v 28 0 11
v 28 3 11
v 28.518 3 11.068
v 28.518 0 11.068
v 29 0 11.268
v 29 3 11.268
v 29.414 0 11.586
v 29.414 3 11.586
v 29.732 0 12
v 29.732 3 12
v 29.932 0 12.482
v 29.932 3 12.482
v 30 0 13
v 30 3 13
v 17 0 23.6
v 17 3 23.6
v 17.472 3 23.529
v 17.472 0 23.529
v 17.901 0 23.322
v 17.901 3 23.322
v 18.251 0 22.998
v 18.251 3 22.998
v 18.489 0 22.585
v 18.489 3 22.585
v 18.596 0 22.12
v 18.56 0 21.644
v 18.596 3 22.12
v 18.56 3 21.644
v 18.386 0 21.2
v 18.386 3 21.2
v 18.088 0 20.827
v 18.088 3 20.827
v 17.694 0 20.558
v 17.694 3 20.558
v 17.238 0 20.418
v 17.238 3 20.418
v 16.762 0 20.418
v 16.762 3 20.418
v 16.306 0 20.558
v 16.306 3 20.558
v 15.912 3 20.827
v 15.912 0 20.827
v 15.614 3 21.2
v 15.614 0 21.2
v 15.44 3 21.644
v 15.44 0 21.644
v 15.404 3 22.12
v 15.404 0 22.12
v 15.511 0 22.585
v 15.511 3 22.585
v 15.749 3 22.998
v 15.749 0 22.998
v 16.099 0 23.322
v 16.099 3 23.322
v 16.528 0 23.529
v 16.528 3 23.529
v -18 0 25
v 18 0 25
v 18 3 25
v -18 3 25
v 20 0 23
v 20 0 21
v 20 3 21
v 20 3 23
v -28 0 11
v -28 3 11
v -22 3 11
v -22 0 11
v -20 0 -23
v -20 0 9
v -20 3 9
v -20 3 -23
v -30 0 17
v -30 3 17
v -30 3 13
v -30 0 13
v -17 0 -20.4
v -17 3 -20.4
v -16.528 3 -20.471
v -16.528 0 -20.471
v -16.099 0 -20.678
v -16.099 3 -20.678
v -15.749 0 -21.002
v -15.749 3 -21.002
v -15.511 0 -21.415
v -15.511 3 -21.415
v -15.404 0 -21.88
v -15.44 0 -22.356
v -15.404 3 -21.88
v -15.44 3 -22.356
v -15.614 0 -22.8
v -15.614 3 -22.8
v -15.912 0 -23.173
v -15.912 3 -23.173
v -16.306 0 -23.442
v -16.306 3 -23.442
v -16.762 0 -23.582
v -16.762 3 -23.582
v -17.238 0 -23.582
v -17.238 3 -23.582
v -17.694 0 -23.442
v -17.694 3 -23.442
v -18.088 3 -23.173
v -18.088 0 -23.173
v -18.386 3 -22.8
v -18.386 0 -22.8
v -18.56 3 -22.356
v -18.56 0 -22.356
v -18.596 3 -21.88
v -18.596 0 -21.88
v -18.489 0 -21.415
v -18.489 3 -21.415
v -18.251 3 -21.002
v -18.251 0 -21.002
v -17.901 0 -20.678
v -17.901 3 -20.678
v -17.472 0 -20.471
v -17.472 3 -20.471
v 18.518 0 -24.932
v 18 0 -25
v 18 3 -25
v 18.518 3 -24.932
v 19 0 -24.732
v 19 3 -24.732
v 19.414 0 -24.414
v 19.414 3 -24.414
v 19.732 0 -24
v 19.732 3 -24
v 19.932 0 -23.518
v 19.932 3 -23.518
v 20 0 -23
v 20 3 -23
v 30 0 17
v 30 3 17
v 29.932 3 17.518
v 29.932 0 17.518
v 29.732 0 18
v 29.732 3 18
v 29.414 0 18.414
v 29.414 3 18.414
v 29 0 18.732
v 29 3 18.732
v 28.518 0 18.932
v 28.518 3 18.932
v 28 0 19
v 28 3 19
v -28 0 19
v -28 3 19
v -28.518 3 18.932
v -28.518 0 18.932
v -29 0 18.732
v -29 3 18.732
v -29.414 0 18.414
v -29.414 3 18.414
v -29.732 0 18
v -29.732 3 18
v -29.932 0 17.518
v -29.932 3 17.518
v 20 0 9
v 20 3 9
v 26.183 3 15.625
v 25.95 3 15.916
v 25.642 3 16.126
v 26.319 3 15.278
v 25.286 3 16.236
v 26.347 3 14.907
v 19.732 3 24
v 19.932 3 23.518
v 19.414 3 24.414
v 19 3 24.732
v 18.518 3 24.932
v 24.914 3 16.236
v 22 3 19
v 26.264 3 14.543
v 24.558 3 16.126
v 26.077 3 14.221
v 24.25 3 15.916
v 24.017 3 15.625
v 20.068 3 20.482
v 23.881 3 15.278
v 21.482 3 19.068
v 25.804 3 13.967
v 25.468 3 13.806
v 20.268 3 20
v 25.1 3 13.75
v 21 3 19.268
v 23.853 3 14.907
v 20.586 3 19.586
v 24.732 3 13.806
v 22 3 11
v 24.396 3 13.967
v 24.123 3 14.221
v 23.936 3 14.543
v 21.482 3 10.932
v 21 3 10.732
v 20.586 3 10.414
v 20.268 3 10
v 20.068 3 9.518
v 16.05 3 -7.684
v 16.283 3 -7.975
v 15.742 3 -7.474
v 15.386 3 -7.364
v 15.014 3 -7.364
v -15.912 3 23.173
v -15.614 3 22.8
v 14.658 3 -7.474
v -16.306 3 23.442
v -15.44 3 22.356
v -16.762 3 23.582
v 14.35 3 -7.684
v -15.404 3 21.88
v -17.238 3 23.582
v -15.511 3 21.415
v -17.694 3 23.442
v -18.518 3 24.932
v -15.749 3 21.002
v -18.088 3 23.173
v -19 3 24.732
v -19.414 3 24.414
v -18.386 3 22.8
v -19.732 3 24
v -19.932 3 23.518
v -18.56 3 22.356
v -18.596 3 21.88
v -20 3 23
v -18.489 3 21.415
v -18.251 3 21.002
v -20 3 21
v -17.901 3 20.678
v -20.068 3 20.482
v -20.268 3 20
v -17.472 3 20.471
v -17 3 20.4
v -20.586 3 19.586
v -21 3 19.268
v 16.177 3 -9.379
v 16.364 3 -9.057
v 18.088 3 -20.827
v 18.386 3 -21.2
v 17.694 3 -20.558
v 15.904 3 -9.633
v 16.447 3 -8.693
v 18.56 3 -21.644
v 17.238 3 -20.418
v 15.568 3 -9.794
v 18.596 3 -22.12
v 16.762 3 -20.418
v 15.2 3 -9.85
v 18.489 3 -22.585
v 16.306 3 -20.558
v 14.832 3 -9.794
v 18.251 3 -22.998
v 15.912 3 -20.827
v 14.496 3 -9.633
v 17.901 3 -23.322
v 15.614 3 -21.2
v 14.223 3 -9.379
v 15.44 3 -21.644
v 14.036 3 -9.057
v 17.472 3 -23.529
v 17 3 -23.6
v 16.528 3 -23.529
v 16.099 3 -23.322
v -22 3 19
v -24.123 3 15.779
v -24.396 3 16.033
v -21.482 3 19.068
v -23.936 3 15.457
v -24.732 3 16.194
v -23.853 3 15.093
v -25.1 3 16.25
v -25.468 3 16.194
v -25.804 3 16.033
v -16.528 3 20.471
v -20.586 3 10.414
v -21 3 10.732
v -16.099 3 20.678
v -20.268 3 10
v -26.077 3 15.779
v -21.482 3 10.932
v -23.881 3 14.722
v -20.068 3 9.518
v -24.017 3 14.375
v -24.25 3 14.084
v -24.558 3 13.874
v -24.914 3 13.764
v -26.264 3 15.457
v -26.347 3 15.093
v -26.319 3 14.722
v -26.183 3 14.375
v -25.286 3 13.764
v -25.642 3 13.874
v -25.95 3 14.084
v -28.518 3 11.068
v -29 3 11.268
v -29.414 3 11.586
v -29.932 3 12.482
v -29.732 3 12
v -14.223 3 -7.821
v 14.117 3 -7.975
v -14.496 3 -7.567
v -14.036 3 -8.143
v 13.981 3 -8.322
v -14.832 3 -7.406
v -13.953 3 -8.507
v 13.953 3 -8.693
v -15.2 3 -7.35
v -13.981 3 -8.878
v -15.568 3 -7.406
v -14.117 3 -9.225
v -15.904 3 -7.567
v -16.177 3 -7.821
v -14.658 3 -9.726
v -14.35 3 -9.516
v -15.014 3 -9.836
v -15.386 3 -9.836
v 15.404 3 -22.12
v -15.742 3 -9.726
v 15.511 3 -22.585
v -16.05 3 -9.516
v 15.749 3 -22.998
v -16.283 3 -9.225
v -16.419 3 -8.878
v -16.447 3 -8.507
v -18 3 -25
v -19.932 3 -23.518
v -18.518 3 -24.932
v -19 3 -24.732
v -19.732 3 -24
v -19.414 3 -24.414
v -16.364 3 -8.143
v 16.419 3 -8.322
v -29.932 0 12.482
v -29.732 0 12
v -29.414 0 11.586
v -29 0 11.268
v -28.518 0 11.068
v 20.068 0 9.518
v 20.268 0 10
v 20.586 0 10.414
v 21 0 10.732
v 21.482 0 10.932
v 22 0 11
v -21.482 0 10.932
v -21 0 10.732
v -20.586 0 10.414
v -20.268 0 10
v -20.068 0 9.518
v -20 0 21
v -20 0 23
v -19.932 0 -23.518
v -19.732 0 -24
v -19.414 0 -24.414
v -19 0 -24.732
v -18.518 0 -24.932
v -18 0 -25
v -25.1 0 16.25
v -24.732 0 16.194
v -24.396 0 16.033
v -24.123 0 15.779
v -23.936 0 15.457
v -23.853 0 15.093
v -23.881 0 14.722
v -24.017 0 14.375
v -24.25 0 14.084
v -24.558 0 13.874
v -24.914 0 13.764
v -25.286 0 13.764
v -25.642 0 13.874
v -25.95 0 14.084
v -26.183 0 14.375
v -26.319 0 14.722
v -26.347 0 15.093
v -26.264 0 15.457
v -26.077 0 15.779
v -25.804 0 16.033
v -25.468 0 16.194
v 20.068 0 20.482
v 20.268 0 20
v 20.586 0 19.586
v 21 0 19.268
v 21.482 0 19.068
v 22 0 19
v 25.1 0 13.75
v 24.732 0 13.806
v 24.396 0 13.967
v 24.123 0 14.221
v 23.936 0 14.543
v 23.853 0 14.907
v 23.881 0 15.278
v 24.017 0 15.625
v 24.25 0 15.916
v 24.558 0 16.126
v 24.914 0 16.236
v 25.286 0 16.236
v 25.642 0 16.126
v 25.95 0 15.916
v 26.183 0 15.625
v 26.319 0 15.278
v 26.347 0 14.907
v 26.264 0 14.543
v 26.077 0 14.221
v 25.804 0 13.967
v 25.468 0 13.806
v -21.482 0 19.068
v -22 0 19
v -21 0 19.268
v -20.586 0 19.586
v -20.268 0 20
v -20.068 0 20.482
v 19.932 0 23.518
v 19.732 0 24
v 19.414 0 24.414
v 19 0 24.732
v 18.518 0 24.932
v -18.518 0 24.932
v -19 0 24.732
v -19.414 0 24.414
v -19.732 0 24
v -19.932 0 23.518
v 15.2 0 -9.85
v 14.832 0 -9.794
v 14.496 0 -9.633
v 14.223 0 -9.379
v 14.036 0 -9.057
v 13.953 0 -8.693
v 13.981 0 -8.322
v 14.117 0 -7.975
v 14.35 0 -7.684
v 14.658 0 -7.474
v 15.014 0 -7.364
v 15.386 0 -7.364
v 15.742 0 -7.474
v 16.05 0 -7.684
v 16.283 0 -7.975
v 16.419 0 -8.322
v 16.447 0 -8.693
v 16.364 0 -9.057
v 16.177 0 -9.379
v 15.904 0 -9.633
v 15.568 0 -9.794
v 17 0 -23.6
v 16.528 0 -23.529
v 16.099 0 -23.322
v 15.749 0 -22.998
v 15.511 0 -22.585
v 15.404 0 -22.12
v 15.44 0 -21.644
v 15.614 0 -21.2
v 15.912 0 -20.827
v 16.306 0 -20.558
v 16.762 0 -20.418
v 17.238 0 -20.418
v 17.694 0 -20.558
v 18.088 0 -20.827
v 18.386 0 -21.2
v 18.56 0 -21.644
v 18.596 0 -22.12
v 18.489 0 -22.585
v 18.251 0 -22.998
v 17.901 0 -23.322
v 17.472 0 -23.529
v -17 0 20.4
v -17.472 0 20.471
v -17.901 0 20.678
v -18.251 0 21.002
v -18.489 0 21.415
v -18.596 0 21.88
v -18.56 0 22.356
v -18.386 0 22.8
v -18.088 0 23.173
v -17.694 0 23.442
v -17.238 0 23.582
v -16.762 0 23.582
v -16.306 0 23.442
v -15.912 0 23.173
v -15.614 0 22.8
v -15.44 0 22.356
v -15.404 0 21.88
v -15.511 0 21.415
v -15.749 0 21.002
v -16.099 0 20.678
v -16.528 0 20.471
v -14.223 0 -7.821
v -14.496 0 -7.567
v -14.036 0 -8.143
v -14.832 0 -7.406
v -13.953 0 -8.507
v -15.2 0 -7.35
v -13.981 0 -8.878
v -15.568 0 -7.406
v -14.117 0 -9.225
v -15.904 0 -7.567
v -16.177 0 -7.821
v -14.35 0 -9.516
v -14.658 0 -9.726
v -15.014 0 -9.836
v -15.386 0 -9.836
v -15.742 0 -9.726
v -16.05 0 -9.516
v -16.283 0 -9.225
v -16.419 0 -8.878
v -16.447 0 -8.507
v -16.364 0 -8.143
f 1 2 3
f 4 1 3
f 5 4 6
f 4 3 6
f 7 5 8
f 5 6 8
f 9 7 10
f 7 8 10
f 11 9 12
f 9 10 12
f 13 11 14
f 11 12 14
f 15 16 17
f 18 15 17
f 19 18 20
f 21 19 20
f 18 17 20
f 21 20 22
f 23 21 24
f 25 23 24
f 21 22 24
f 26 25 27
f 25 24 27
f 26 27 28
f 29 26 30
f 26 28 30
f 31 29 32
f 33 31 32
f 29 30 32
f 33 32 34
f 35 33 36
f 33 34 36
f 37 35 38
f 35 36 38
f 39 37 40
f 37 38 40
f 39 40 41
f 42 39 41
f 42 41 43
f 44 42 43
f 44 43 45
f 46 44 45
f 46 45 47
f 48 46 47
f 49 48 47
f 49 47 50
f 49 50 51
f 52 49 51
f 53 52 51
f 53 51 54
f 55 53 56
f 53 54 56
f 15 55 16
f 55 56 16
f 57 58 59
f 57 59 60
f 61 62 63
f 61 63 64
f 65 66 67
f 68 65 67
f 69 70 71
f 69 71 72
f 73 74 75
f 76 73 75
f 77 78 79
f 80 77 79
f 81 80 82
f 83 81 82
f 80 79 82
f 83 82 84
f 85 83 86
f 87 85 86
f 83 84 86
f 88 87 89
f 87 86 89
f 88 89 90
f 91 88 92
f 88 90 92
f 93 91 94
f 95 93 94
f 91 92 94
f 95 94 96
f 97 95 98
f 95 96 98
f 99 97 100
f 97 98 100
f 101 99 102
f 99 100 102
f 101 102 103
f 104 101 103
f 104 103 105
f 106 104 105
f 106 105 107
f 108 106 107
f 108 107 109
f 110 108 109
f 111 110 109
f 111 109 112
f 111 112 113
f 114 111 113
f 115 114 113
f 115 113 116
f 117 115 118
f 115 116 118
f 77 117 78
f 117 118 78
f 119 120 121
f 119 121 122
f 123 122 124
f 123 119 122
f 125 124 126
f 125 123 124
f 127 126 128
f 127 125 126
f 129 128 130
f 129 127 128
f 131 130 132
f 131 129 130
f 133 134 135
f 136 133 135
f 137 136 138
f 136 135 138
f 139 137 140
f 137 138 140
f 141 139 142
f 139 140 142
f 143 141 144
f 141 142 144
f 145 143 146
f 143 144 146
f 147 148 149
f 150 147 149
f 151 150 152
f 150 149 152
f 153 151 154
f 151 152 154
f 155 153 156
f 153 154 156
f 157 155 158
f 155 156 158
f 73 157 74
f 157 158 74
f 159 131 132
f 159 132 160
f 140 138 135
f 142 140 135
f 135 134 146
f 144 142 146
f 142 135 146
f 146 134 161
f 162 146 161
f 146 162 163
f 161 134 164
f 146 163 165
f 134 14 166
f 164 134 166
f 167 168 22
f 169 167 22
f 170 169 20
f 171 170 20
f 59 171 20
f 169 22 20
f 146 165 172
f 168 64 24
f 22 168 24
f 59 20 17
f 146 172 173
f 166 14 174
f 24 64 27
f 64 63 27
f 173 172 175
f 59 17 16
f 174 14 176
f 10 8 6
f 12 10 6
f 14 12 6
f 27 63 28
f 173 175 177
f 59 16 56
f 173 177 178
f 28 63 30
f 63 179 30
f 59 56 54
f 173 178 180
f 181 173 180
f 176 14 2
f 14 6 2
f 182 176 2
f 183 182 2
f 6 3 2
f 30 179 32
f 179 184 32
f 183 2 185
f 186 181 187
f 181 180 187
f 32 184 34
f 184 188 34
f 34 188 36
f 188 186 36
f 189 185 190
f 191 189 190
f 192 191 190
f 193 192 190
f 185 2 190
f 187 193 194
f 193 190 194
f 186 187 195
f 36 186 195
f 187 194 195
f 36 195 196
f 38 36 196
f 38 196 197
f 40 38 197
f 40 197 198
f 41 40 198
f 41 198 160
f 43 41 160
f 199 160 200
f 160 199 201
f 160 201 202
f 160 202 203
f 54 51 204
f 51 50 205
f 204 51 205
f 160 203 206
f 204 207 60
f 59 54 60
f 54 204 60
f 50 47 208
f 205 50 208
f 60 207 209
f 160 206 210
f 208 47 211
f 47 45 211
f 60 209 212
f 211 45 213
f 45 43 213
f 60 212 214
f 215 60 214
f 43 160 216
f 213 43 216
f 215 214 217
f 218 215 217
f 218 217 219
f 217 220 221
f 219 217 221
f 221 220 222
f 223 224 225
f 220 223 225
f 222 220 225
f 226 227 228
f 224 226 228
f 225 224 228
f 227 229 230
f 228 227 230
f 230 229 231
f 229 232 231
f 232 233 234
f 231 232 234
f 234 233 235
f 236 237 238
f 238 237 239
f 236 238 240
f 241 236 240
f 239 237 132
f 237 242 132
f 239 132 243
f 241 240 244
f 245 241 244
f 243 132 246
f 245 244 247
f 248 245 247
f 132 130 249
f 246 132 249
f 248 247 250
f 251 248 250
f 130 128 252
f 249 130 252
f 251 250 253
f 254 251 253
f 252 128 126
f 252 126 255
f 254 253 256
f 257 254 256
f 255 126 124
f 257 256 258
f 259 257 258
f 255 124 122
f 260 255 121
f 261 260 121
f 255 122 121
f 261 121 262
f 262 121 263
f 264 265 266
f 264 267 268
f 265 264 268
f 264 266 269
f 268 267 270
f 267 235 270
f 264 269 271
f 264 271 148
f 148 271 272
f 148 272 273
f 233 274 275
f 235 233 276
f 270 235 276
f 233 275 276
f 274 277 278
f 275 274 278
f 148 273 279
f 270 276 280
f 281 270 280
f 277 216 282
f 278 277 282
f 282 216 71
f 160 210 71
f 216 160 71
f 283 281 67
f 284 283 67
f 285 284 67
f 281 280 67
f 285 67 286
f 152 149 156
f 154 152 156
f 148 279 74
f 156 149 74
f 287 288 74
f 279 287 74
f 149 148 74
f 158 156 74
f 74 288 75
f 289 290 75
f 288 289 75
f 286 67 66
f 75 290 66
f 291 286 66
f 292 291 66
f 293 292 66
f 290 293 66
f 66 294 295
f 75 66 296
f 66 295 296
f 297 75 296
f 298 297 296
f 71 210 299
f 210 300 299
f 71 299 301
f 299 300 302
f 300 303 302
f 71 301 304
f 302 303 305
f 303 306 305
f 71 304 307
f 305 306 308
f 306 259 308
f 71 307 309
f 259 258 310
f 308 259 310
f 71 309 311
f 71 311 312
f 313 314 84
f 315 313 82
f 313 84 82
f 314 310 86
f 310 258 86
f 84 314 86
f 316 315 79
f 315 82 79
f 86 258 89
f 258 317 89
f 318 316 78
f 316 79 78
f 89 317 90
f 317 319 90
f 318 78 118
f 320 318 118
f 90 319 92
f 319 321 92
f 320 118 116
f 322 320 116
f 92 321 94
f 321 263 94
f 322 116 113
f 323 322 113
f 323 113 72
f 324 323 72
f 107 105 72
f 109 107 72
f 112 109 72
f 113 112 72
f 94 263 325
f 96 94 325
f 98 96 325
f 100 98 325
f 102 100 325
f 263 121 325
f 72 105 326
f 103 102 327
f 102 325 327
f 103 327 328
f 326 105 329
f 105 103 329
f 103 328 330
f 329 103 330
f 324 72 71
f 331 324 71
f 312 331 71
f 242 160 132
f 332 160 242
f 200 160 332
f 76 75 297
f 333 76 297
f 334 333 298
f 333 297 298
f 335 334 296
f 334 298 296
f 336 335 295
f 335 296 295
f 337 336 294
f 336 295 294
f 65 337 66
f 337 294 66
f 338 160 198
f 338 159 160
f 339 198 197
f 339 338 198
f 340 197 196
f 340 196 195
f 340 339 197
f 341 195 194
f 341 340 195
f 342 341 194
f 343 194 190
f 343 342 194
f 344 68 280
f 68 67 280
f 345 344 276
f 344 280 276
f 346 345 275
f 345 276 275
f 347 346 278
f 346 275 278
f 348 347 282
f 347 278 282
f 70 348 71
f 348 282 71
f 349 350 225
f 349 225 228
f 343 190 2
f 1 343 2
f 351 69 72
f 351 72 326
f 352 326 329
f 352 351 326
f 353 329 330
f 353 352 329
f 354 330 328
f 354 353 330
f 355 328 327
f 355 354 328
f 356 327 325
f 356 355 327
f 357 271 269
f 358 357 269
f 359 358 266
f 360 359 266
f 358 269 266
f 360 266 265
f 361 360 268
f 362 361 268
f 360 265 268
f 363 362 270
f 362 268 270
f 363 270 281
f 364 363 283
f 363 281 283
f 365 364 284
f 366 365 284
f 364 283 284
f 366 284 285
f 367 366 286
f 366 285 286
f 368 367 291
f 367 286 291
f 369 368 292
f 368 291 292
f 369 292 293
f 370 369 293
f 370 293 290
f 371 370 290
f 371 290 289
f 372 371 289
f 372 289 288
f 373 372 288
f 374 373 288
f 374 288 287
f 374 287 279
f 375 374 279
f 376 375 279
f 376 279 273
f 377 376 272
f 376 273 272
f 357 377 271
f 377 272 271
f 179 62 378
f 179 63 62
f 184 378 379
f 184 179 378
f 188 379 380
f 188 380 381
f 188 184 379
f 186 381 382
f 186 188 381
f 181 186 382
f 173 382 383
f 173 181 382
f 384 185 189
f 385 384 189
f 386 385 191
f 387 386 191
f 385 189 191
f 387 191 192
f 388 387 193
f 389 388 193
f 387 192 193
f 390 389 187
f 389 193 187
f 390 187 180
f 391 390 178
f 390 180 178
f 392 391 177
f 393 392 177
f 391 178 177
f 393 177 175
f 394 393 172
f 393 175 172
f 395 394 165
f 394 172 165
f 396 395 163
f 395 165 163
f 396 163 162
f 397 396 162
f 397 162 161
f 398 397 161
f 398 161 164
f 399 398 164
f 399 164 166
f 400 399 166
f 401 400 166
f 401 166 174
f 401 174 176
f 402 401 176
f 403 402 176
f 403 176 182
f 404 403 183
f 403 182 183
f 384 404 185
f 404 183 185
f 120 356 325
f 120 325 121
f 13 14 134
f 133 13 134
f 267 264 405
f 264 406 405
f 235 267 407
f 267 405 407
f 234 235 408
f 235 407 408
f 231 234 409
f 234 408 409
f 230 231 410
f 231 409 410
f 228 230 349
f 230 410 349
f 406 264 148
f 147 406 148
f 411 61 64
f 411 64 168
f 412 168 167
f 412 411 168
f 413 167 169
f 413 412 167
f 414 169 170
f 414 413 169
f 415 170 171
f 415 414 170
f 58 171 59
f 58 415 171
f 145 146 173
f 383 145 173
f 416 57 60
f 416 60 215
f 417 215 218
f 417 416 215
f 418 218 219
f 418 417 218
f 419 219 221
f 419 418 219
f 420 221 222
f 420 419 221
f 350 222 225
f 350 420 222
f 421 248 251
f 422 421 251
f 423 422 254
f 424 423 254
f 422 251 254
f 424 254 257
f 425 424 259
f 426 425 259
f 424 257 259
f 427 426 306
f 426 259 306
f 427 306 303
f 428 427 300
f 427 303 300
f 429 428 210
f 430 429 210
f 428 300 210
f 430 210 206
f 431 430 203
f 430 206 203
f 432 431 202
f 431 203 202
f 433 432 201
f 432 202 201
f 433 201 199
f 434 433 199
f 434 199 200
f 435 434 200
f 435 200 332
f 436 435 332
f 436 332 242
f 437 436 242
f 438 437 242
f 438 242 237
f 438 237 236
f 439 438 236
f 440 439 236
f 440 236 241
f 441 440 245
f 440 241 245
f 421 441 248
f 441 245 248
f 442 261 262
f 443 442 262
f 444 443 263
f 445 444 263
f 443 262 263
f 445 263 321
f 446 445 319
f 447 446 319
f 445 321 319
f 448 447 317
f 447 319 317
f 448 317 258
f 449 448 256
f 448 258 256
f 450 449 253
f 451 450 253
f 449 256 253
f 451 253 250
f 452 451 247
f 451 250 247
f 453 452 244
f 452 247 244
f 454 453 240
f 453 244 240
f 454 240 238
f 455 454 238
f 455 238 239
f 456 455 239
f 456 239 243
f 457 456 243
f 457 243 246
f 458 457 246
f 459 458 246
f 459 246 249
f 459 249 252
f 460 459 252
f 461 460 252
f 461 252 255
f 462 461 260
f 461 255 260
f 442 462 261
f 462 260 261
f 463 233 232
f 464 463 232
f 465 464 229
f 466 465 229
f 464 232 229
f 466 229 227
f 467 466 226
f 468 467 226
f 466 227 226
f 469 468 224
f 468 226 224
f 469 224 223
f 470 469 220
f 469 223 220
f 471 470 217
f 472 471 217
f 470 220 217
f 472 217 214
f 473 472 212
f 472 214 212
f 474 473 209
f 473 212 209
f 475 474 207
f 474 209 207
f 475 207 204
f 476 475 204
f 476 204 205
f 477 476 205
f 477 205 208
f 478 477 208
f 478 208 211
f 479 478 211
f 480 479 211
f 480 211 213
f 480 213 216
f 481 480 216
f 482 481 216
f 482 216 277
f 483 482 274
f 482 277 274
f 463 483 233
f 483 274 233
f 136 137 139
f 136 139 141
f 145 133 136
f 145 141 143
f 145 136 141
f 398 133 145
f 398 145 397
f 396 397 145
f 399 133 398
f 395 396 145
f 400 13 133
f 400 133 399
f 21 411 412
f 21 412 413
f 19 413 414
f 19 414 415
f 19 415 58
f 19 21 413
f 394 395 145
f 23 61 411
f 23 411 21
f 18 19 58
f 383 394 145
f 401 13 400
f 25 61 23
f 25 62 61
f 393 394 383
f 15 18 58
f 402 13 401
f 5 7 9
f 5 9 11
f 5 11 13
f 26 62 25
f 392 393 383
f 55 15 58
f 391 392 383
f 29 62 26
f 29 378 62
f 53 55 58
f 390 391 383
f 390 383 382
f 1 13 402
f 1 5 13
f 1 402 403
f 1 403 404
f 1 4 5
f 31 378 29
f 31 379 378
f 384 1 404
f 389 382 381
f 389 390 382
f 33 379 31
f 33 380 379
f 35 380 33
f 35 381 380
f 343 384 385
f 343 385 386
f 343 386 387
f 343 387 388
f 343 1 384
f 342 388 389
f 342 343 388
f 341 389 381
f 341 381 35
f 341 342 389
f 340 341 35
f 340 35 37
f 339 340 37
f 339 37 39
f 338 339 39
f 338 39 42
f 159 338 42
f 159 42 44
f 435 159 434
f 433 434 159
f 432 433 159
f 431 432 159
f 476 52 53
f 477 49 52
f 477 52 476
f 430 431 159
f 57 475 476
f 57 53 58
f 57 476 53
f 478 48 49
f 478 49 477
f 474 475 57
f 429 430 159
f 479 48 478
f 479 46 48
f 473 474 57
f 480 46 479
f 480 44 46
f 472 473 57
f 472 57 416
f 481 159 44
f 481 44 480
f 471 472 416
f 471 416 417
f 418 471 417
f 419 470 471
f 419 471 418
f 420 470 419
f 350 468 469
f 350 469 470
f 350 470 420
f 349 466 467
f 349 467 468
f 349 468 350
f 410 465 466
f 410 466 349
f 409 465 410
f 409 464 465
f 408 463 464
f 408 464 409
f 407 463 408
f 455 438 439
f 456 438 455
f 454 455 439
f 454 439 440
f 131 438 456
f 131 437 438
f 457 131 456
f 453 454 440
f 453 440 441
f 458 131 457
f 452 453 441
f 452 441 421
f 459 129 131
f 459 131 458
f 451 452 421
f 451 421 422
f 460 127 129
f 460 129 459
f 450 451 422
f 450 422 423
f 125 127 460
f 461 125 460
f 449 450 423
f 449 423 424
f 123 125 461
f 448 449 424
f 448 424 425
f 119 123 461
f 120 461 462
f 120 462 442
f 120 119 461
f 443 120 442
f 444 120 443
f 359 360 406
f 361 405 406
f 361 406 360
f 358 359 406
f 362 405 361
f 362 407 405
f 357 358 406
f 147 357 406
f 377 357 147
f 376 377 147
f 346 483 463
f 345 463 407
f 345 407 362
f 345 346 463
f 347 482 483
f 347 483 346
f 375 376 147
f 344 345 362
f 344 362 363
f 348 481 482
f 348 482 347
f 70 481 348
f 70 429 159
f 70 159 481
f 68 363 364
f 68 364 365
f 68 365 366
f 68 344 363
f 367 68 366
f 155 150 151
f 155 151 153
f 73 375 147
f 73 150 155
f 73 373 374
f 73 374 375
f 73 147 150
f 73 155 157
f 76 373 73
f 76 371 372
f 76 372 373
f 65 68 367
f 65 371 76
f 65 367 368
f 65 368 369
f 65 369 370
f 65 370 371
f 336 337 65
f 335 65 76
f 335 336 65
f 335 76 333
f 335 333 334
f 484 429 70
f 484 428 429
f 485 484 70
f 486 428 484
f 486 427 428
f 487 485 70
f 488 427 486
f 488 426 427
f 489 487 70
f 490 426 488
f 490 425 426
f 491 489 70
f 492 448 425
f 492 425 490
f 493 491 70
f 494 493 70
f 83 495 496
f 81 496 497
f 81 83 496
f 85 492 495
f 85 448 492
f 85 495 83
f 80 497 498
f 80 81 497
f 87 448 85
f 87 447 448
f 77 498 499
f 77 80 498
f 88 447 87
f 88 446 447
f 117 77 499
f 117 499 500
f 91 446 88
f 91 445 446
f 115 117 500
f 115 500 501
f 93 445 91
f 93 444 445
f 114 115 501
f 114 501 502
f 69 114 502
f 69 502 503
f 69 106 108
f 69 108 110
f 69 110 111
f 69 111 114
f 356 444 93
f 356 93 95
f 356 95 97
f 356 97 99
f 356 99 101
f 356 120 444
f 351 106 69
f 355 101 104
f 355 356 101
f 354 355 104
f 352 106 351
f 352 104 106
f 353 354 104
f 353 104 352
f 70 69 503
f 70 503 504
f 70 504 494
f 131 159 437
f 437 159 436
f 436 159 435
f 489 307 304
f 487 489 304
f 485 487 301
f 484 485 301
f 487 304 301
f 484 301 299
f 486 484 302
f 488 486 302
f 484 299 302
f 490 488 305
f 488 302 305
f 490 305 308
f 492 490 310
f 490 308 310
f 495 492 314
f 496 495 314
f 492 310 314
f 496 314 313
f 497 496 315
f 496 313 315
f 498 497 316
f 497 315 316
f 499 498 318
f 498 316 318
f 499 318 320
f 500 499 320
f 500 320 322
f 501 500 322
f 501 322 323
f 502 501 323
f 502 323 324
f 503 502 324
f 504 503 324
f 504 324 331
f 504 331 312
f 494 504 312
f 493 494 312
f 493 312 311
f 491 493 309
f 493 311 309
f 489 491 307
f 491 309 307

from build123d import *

# Parameters (mm, degrees)
EXTRUDE_1_DEPTH     = 3
EXTRUDE_2_DEPTH     = 3
SKETCH_2_R          = 1.25
CUT_EXTRUDE_1_DEPTH = 3
SKETCH_3_R          = 1.6
CUT_EXTRUDE_2_DEPTH = 3
FILLET_1_R          = 2


with BuildPart() as part:
    # 草图1 → 凸台-拉伸1 (new body)
    with BuildSketch(Plane(origin=(0, 0, 0), x_dir=(1, 0, 0), z_dir=(0, 1, 0))):
        with BuildLine():
            Line((-18, 25), (18, 25))
            ThreePointArc((18, 25), (19.414213562, 24.414213562), (20, 23))
            Line((20, 23), (20, -23))
            ThreePointArc((20, -23), (19.414213562, -24.414213562), (18, -25))
            Line((18, -25), (-18, -25))
            ThreePointArc((-18, -25), (-19.414213562, -24.414213562), (-20, -23))
            Line((-20, -23), (-20, 23))
            ThreePointArc((-20, 23), (-19.414213562, 24.414213562), (-18, 25))
        make_face()
    extrude(amount=EXTRUDE_1_DEPTH)

    # 草图4 → 凸台-拉伸2 (add)
    with BuildSketch(Plane(origin=(0, 3, 0), x_dir=(1, 0, 0), z_dir=(0, 1, 0))):
        with BuildLine():
            Line((-28, -11), (28, -11))
            ThreePointArc((28, -11), (29.414213562, -11.585786438), (30, -13))
            Line((30, -13), (30, -17))
            ThreePointArc((30, -17), (29.414213562, -18.414213562), (28, -19))
            Line((28, -19), (-28, -19))
            ThreePointArc((-28, -19), (-29.414213562, -18.414213562), (-30, -17))
            Line((-30, -17), (-30, -13))
            ThreePointArc((-30, -13), (-29.414213562, -11.585786438), (-28, -11))
        make_face()
    extrude(amount=-EXTRUDE_2_DEPTH)

    # 草图2 → 切除-拉伸1 (cut)
    with BuildSketch(Plane(origin=(0, 3, 0), x_dir=(1, 0, 0), z_dir=(0, 1, 0))):
        with Locations(Location((-25.1, -15, 0), (0, 0, 270))):
            Circle(SKETCH_2_R)
        with Locations(Location((-15.2, 8.6, 0), (0, 0, 270))):
            Circle(SKETCH_2_R)
        with Locations(Location((15.2, 8.6, 0), (0, 0, 90))):
            Circle(SKETCH_2_R)
        with Locations(Location((25.1, -15, 0), (0, 0, 90))):
            Circle(SKETCH_2_R)
    extrude(amount=-CUT_EXTRUDE_1_DEPTH, mode=Mode.SUBTRACT)

    # 草图3 → 切除-拉伸2 (cut)
    with BuildSketch(Plane(origin=(0, 3, 0), x_dir=(1, 0, 0), z_dir=(0, 1, 0))):
        with Locations(Location((-17, 22, 0), (0, 0, 270))):
            Circle(SKETCH_3_R)
        with Locations(Location((-17, -22, 0), (0, 0, 90))):
            Circle(SKETCH_3_R)
        with Locations(Location((17, -22, 0), (0, 0, 270))):
            Circle(SKETCH_3_R)
        with Locations(Location((17, 22, 0), (0, 0, 90))):
            Circle(SKETCH_3_R)
    extrude(amount=-CUT_EXTRUDE_2_DEPTH, mode=Mode.SUBTRACT)

    # 圆角1
    fillet_1_edges = [part.edges().sort_by_distance(p)[0] for p in [
        (-20, 1.5, 11),
        (20, 1.5, 11),
        (-20, 1.5, 19),
        (20, 1.5, 19),
    ]]
    fillet(fillet_1_edges, radius=FILLET_1_R)


solid = part.part
